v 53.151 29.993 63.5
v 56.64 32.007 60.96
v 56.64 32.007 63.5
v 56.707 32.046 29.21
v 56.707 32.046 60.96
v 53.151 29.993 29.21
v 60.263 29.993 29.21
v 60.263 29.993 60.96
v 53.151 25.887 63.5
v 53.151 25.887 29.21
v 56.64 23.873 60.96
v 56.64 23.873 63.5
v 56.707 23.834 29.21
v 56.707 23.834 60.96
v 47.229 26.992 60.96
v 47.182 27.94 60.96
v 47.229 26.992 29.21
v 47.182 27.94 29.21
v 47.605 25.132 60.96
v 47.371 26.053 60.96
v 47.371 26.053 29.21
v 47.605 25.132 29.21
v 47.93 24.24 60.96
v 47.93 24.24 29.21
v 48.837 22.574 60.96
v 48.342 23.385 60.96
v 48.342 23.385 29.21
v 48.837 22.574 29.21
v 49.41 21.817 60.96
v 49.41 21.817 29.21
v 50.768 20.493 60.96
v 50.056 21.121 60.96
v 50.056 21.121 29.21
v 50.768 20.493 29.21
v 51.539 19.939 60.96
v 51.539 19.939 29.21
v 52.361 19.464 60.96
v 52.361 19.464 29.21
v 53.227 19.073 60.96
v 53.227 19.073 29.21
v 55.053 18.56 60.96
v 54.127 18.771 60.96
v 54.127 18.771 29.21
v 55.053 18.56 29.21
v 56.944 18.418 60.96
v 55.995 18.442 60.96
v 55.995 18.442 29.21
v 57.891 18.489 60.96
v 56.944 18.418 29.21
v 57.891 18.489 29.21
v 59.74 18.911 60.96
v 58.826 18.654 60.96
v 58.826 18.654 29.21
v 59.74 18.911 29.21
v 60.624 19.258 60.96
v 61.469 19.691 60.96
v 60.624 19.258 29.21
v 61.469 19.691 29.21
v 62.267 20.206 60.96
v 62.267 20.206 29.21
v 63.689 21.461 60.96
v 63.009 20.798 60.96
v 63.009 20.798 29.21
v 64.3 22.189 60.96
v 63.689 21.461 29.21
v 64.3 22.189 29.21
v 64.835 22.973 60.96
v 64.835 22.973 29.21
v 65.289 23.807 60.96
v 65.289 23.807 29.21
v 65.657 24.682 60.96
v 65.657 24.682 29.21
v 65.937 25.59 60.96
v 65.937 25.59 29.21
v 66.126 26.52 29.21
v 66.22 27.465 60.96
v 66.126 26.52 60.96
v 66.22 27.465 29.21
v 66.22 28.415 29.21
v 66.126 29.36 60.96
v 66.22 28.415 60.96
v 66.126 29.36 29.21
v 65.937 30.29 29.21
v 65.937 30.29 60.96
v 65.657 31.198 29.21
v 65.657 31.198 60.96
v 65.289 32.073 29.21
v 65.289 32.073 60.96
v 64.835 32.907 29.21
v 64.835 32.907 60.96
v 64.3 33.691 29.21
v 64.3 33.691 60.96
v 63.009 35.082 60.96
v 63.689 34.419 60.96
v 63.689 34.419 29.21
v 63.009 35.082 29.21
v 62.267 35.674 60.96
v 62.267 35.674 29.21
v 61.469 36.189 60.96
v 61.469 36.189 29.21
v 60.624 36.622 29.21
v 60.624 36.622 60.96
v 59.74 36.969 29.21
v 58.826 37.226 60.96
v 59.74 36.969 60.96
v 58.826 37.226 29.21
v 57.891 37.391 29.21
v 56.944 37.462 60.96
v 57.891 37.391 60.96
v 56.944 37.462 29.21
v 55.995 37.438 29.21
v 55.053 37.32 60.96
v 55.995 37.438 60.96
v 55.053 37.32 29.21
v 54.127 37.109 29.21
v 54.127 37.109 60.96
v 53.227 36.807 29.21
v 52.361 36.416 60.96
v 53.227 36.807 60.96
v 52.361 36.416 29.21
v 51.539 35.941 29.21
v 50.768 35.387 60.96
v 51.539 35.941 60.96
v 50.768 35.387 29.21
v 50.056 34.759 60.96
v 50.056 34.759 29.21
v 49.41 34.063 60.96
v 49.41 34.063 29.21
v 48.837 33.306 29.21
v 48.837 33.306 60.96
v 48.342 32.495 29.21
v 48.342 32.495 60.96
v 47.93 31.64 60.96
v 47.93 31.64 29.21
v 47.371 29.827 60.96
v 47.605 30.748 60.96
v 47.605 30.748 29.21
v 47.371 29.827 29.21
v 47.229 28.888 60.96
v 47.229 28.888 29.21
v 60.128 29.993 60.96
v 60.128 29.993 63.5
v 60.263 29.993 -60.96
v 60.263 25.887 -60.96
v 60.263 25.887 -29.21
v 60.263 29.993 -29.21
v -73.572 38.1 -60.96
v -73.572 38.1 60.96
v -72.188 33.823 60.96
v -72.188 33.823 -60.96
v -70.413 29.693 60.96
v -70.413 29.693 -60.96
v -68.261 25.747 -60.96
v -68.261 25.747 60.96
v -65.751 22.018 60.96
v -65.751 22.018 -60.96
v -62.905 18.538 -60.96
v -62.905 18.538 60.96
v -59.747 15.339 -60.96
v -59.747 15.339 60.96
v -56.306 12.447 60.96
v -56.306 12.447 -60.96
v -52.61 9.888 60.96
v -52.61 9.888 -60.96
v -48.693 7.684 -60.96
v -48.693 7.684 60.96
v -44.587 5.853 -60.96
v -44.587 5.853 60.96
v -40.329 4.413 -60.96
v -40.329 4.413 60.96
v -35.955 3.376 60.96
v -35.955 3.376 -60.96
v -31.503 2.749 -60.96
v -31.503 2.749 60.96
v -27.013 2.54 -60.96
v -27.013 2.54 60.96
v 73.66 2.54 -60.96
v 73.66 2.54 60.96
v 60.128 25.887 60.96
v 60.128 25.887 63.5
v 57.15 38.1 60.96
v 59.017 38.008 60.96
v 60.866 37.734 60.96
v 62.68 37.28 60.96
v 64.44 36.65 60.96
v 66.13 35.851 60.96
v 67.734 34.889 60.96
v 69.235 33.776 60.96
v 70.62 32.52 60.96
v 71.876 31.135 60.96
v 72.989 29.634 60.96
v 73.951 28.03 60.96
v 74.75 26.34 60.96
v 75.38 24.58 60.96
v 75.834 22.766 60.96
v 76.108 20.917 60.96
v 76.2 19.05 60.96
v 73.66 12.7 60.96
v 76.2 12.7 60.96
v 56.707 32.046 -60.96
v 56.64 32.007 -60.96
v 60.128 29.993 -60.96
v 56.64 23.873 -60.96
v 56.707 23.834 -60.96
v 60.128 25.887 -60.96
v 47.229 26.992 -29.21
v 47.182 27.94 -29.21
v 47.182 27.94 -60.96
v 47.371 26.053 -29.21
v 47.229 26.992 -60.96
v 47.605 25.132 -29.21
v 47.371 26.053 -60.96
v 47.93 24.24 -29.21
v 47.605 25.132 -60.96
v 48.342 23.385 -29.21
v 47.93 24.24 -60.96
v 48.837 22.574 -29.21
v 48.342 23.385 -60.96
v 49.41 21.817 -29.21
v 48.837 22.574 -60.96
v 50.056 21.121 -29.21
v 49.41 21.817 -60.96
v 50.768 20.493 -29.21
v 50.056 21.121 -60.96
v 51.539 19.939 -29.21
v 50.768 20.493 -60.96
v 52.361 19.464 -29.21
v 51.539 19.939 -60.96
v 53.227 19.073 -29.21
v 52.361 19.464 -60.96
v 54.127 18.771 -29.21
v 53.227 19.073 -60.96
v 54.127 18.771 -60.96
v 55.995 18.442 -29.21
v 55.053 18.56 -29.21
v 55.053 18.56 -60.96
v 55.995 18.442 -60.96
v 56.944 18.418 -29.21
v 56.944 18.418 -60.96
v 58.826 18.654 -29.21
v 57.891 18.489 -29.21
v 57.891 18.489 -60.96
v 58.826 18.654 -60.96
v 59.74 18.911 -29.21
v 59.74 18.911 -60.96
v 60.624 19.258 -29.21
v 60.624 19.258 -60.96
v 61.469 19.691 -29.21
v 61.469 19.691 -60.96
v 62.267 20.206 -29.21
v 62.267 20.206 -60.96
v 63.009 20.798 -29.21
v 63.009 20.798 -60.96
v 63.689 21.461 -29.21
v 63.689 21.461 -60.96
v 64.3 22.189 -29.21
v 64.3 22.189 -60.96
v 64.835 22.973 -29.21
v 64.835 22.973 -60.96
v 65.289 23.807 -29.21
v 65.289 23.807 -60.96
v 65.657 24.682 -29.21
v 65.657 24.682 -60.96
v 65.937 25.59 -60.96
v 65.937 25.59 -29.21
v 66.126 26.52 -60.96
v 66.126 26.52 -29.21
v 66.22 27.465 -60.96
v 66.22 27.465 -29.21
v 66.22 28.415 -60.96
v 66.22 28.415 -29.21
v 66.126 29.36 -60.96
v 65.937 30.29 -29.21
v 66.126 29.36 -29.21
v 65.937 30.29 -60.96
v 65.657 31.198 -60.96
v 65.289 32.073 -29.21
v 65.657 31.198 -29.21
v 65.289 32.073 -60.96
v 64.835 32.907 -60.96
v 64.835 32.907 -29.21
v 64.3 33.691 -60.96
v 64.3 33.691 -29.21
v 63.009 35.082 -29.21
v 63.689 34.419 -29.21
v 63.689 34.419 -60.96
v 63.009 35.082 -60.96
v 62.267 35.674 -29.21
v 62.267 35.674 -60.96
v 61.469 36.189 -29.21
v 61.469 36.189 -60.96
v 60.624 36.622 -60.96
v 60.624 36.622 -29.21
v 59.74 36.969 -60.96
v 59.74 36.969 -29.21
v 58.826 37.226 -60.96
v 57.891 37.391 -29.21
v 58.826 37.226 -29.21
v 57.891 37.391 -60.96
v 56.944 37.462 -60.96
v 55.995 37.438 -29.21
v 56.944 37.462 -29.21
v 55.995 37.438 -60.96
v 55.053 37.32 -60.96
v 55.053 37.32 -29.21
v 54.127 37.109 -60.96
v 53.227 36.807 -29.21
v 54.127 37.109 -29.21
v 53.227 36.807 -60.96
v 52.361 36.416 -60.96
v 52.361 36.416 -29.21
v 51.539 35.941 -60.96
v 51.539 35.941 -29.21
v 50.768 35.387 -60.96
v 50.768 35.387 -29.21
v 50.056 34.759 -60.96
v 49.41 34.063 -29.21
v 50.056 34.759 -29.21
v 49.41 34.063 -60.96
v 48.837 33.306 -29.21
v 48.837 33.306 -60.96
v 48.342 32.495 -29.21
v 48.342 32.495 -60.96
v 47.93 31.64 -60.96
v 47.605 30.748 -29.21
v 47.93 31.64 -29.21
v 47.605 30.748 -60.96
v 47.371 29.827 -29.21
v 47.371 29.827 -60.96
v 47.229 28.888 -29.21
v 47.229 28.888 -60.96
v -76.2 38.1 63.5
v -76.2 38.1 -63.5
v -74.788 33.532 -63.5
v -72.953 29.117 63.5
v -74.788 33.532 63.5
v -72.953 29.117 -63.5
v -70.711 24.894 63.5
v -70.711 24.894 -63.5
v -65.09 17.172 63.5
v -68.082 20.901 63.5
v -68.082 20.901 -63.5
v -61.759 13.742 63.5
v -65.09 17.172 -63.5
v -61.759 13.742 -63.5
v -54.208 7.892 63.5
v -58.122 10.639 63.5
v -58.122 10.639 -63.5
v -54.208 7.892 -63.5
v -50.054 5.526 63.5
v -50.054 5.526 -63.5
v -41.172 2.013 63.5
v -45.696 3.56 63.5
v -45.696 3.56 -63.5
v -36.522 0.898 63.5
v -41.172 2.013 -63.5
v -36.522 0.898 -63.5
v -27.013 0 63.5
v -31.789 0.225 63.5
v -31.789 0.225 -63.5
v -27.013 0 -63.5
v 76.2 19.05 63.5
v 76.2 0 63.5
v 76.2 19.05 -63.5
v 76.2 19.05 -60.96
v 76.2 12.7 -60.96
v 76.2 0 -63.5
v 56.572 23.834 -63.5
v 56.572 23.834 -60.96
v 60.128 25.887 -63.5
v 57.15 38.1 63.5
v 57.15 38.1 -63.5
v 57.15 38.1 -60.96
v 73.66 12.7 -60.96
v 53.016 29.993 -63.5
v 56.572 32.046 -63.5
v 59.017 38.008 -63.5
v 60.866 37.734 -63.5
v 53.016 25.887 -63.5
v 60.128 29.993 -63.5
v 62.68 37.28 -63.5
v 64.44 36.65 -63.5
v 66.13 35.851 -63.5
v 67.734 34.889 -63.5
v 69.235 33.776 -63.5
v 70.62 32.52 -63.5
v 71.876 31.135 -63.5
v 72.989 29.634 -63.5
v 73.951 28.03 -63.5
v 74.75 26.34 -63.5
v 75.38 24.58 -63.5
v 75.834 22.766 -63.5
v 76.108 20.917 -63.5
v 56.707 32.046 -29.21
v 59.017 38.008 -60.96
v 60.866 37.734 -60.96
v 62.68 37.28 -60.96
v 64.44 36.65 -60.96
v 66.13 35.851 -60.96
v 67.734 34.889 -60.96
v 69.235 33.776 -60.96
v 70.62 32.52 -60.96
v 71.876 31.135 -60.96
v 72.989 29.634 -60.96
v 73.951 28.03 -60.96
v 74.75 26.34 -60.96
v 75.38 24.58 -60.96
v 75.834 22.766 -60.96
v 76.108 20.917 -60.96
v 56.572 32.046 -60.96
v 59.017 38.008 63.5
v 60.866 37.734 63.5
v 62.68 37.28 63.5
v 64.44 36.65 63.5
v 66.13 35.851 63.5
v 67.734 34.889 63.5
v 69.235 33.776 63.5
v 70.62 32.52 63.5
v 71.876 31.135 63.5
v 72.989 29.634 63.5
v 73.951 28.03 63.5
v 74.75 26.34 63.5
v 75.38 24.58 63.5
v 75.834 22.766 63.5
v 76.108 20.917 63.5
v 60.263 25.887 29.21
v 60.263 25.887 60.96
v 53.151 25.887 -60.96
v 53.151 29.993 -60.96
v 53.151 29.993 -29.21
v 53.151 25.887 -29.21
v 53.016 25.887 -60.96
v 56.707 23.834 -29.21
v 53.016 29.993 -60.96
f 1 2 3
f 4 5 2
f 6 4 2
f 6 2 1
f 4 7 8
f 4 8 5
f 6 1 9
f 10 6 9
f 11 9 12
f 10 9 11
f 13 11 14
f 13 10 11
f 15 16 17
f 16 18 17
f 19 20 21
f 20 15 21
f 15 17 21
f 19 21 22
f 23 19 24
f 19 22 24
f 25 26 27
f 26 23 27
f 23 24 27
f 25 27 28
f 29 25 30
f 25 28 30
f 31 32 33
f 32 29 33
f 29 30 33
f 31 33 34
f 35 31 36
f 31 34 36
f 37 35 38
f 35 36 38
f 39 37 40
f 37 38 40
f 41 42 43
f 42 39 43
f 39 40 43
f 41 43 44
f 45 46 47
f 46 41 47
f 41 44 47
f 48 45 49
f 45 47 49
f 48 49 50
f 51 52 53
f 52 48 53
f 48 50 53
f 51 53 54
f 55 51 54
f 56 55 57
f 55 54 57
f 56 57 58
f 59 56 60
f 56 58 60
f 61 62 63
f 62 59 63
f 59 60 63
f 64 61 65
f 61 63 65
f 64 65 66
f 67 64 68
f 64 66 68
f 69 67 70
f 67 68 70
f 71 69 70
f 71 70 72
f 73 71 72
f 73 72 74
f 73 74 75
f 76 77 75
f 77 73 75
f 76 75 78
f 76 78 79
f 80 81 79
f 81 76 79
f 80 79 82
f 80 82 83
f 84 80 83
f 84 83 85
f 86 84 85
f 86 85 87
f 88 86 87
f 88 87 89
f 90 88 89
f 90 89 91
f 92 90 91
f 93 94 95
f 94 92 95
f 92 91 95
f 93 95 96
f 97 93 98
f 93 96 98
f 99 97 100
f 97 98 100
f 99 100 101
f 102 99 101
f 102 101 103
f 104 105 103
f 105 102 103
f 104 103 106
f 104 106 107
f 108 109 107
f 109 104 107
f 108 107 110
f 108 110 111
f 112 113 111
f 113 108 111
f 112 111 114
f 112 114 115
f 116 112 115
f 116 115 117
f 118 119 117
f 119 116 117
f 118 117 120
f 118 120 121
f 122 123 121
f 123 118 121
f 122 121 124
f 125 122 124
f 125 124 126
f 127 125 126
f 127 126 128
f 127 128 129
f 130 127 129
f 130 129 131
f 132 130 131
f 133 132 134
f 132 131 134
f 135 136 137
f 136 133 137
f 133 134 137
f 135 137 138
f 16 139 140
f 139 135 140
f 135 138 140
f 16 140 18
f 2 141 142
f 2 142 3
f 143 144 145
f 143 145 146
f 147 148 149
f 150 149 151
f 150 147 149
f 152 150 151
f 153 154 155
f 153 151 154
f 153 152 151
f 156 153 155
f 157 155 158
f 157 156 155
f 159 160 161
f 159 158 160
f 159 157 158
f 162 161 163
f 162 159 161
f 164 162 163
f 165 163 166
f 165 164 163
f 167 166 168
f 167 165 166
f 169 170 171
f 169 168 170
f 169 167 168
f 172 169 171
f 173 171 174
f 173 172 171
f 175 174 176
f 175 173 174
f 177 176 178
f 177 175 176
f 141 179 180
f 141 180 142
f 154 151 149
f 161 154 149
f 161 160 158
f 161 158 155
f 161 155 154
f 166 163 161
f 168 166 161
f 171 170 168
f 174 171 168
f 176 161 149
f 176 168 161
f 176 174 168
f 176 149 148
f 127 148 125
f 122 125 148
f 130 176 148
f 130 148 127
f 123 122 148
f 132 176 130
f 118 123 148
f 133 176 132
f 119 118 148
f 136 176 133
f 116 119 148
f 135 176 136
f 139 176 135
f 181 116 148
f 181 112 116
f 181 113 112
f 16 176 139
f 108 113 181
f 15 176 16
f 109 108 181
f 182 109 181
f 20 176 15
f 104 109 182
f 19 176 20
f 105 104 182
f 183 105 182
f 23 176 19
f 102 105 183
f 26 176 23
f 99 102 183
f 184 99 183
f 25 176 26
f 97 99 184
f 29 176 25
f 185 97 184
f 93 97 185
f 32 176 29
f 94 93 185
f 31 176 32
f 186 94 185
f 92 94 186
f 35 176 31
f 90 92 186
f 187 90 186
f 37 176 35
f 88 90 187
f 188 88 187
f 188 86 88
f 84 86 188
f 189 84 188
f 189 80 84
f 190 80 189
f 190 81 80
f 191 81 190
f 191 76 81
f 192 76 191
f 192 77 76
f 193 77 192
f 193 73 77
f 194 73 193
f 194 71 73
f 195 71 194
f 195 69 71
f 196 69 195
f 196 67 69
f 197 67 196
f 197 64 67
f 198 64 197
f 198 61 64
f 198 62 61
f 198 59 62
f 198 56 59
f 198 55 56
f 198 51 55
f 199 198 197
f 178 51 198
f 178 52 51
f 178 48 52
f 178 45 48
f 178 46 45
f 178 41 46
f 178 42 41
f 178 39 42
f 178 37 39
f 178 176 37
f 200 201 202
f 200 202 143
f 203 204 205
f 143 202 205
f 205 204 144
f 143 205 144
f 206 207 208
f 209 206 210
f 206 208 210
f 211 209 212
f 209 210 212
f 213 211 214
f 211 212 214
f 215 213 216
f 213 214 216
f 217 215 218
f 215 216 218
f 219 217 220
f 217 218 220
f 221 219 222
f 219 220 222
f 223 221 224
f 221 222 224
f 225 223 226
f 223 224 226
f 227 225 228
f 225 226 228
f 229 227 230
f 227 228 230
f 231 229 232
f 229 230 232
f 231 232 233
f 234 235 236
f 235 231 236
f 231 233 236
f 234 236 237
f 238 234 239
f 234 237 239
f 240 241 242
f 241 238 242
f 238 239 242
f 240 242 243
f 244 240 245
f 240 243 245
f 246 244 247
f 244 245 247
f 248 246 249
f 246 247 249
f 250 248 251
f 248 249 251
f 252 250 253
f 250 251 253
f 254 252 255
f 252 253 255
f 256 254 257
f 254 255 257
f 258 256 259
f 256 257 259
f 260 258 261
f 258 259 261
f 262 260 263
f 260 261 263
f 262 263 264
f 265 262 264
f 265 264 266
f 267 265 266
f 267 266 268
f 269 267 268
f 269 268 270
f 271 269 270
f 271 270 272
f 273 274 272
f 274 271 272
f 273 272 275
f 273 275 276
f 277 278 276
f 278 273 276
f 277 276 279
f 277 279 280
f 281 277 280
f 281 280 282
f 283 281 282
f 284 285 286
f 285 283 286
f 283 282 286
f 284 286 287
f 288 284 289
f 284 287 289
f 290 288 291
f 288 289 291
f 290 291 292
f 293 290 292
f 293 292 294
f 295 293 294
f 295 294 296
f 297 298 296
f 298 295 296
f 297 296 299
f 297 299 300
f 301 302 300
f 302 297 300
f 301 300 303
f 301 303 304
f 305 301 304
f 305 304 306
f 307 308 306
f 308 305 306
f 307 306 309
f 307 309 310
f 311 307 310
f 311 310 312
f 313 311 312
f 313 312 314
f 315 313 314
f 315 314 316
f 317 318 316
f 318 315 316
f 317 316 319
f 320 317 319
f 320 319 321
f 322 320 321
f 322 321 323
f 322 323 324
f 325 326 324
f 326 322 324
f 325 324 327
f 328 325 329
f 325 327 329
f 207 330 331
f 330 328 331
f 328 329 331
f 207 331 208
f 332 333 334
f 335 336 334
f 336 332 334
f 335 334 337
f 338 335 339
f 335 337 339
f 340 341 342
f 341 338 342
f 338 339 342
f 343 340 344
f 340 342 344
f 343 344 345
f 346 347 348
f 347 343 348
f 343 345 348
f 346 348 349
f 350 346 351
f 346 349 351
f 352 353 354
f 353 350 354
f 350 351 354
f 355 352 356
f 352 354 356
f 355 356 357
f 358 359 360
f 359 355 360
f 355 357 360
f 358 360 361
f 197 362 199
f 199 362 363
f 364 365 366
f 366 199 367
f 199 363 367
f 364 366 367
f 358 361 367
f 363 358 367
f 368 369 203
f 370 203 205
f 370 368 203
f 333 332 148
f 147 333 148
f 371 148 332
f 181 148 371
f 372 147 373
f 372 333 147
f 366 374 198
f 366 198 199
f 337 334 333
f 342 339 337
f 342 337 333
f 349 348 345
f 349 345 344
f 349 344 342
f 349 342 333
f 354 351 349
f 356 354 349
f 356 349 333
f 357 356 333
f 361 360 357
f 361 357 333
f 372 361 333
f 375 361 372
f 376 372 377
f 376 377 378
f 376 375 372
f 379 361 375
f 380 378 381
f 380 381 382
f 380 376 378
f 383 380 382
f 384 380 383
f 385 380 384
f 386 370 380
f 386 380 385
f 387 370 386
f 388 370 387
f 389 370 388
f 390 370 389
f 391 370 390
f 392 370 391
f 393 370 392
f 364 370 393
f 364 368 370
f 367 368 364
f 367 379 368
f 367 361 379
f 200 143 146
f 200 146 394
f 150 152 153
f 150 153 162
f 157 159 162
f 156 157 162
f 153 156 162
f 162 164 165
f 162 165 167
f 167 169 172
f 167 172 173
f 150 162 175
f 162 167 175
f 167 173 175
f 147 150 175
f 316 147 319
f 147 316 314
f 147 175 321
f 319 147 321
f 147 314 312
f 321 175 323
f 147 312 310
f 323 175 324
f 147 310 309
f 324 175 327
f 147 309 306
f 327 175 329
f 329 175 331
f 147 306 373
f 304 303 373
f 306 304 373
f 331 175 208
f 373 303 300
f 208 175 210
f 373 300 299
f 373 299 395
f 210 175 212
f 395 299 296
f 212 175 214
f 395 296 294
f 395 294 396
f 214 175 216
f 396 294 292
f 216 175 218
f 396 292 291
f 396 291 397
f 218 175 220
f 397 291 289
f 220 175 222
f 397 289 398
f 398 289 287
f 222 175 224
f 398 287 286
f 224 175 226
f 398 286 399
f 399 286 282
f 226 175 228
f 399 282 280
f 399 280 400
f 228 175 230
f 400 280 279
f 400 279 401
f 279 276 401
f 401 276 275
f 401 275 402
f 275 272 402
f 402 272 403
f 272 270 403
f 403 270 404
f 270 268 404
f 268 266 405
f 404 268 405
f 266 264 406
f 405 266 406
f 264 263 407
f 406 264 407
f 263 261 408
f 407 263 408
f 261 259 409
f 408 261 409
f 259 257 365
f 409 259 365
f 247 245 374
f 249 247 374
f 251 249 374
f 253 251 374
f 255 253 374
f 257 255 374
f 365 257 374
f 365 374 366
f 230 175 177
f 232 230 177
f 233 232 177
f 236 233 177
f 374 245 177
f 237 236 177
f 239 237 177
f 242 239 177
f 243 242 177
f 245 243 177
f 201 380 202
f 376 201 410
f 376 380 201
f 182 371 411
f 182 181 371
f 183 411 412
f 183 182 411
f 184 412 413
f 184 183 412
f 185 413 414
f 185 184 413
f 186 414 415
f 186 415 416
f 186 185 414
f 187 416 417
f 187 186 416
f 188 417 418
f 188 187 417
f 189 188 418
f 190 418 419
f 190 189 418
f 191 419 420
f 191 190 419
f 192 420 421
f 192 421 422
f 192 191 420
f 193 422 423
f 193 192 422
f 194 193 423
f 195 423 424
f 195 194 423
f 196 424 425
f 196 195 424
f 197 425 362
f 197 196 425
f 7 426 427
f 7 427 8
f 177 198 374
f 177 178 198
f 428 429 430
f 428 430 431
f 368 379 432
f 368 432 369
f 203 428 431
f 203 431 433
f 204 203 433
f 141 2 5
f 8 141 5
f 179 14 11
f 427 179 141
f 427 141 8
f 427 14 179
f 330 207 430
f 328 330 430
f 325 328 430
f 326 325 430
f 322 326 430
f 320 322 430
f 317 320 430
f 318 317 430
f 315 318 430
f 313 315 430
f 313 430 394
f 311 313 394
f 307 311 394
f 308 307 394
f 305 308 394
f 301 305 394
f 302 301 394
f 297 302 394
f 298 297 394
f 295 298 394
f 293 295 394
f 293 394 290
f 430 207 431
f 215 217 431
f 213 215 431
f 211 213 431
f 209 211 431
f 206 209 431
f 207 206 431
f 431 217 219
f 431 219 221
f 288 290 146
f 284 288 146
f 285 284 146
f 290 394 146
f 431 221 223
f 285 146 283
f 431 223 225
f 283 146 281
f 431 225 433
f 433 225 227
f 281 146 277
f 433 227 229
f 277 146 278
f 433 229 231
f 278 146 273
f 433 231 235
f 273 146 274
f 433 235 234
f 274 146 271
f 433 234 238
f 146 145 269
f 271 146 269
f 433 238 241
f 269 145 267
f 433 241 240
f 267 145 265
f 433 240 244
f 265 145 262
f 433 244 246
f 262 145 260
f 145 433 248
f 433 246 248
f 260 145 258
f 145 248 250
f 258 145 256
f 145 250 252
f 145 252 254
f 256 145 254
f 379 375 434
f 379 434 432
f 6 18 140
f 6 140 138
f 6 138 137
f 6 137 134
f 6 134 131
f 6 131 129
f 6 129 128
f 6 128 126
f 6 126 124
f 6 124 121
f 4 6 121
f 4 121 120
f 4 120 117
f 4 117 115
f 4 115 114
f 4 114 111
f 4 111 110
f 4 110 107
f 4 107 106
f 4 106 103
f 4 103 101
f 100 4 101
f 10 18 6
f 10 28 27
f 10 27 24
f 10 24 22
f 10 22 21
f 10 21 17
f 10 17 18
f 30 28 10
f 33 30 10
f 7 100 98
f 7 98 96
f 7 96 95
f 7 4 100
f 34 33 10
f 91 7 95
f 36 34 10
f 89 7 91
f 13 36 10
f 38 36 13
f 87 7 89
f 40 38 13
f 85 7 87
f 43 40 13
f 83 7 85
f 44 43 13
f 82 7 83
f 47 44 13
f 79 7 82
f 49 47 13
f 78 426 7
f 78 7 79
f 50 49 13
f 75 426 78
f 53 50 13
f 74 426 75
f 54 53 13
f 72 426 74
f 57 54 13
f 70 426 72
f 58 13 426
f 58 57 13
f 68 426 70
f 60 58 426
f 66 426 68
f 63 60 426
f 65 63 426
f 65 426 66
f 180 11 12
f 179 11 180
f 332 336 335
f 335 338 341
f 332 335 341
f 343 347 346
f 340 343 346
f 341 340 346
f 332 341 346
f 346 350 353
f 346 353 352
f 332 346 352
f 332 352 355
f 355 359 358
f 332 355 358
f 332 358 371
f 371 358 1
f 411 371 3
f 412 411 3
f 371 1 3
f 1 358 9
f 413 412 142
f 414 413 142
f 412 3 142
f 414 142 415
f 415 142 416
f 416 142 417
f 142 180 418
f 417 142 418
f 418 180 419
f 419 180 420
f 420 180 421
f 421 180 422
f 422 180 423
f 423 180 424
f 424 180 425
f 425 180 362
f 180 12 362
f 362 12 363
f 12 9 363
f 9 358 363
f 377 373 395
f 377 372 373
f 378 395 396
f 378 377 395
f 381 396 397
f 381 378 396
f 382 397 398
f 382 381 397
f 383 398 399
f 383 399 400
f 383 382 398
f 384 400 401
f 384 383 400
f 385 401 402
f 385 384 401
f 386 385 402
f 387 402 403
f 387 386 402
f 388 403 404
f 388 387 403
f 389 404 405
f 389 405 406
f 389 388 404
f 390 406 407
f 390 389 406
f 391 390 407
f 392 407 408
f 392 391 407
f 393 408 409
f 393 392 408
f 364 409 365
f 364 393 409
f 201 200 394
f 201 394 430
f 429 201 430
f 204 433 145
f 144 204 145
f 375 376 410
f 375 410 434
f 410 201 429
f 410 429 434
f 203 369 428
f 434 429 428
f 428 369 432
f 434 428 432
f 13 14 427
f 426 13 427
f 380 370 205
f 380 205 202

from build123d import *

# Parameters (mm, degrees)
SKETCH1_W               = 152.4
SKETCH1_H               = 127
BOSS_EXTRUDE1_DEPTH     = 38.1
FILLET1_R               = 50.8
SHELL1_T                = -2.54
CUT_EXTRUDE2_DEPTH      = 151.825533647
CUT_EXTRUDE2_DEPTH_BACK = 151.825533647
SKETCH4_R               = 9.525
BOSS_EXTRUDE2_DEPTH     = 124.46
SKETCH2_W               = 11.613456366
SKETCH2_H               = 121.92
CUT_EXTRUDE3_DEPTH      = 25.4
SKETCH5_W               = 29.081811675
SKETCH5_H               = 58.42
CUT_EXTRUDE4_DEPTH      = 50.8
FILLET3_R               = 19.05


with BuildPart() as part:
    # Sketch1 → Boss-Extrude1 (new body)
    with BuildSketch(Plane(origin=(0, 0, 0), x_dir=(1, 0, 0), z_dir=(0, 1, 0))):
        Rectangle(SKETCH1_W, SKETCH1_H)
    extrude(amount=BOSS_EXTRUDE1_DEPTH)

    # Fillet1
    # the kernel refuses this fillet: 50.8 mm, written as the material it takes off along each edge
    with BuildSketch(Plane(origin=(-76.2, 0, -186.467221242), x_dir=(0, 1, 0), z_dir=(0, 0, 1))) as fillet1_piece_1:
        with BuildLine():
            CenterArc((50.8, -49.186888497), FILLET1_R, 104.477512186, 75.522487814)
            Line((0, -49.186888497), (-1.016, -49.186888497))
            Line((-1.016, -49.186888497), (-1.016, 0))
            Line((-1.016, 0), (0, 1.016))
            ThreePointArc((0, 1.016), (19.05, 1.016), (37.846, 0.98373777))
            Line((37.846, 0.98373777), (38.1, 0))
        make_face()
    extrude(amount=372.934442484, mode=Mode.SUBTRACT)

    # Shell1
    shell1_openings = [part.faces().sort_by_distance(p)[0] for p in [
        (0, 38.1, 0),
    ]]
    offset(amount=SHELL1_T, openings=shell1_openings, kind=Kind.INTERSECTION)

    # Sketch3 → Cut-Extrude2 (cut, two sides: drawn at the far end of the back side and taken through both)
    with BuildSketch(Plane.XY.offset(-60.96).offset(-CUT_EXTRUDE2_DEPTH_BACK)):
        Polygon((56.572208389, 32.046115114), (53.016208389, 29.993057557), (53.016208389, 25.886942443), (56.572208389, 23.833884886), (60.128208389, 25.886942443), (60.128208389, 29.993057557), align=None)
    extrude(amount=CUT_EXTRUDE2_DEPTH + CUT_EXTRUDE2_DEPTH_BACK, mode=Mode.SUBTRACT)

    # Sketch4 → Boss-Extrude2 (add)
    with BuildSketch(Plane.XY.offset(-60.96)):
        with Locations(Location((56.706906113, 27.94, 0), (0, 0, 180))):
            Circle(SKETCH4_R)
        Polygon((56.706906113, 32.046115114), (53.150906113, 29.993057557), (53.150906113, 25.886942443), (56.706906113, 23.833884886), (60.262906113, 25.886942443), (60.262906113, 29.993057557), align=None, mode=Mode.SUBTRACT)
    extrude(amount=BOSS_EXTRUDE2_DEPTH)

    # Sketch2 → Cut-Extrude3 (cut)
    with BuildSketch(Plane(origin=(0, 38.1, 0), x_dir=(1, 0, 0), z_dir=(0, 1, 0))):
        with Locations((78.243168089, 0)):
            Rectangle(SKETCH2_W, SKETCH2_H)
    extrude(amount=-CUT_EXTRUDE3_DEPTH, mode=Mode.SUBTRACT)

    # Sketch5 → Cut-Extrude4 (cut)
    with BuildSketch(Plane(origin=(0, 2.54, 0), x_dir=(1, 0, 0), z_dir=(0, 1, 0))):
        with Locations((53.93192453, 0)):
            Rectangle(SKETCH5_W, SKETCH5_H)
    extrude(amount=CUT_EXTRUDE4_DEPTH, mode=Mode.SUBTRACT)

    # Fillet3
    fillet3_edges = [part.edges().sort_by_distance(p)[0] for p in [
        (76.2, 38.1, 62.23),
        (76.2, 38.1, -62.23),
    ]]
    fillet(fillet3_edges, radius=FILLET3_R)


solid = part.part
